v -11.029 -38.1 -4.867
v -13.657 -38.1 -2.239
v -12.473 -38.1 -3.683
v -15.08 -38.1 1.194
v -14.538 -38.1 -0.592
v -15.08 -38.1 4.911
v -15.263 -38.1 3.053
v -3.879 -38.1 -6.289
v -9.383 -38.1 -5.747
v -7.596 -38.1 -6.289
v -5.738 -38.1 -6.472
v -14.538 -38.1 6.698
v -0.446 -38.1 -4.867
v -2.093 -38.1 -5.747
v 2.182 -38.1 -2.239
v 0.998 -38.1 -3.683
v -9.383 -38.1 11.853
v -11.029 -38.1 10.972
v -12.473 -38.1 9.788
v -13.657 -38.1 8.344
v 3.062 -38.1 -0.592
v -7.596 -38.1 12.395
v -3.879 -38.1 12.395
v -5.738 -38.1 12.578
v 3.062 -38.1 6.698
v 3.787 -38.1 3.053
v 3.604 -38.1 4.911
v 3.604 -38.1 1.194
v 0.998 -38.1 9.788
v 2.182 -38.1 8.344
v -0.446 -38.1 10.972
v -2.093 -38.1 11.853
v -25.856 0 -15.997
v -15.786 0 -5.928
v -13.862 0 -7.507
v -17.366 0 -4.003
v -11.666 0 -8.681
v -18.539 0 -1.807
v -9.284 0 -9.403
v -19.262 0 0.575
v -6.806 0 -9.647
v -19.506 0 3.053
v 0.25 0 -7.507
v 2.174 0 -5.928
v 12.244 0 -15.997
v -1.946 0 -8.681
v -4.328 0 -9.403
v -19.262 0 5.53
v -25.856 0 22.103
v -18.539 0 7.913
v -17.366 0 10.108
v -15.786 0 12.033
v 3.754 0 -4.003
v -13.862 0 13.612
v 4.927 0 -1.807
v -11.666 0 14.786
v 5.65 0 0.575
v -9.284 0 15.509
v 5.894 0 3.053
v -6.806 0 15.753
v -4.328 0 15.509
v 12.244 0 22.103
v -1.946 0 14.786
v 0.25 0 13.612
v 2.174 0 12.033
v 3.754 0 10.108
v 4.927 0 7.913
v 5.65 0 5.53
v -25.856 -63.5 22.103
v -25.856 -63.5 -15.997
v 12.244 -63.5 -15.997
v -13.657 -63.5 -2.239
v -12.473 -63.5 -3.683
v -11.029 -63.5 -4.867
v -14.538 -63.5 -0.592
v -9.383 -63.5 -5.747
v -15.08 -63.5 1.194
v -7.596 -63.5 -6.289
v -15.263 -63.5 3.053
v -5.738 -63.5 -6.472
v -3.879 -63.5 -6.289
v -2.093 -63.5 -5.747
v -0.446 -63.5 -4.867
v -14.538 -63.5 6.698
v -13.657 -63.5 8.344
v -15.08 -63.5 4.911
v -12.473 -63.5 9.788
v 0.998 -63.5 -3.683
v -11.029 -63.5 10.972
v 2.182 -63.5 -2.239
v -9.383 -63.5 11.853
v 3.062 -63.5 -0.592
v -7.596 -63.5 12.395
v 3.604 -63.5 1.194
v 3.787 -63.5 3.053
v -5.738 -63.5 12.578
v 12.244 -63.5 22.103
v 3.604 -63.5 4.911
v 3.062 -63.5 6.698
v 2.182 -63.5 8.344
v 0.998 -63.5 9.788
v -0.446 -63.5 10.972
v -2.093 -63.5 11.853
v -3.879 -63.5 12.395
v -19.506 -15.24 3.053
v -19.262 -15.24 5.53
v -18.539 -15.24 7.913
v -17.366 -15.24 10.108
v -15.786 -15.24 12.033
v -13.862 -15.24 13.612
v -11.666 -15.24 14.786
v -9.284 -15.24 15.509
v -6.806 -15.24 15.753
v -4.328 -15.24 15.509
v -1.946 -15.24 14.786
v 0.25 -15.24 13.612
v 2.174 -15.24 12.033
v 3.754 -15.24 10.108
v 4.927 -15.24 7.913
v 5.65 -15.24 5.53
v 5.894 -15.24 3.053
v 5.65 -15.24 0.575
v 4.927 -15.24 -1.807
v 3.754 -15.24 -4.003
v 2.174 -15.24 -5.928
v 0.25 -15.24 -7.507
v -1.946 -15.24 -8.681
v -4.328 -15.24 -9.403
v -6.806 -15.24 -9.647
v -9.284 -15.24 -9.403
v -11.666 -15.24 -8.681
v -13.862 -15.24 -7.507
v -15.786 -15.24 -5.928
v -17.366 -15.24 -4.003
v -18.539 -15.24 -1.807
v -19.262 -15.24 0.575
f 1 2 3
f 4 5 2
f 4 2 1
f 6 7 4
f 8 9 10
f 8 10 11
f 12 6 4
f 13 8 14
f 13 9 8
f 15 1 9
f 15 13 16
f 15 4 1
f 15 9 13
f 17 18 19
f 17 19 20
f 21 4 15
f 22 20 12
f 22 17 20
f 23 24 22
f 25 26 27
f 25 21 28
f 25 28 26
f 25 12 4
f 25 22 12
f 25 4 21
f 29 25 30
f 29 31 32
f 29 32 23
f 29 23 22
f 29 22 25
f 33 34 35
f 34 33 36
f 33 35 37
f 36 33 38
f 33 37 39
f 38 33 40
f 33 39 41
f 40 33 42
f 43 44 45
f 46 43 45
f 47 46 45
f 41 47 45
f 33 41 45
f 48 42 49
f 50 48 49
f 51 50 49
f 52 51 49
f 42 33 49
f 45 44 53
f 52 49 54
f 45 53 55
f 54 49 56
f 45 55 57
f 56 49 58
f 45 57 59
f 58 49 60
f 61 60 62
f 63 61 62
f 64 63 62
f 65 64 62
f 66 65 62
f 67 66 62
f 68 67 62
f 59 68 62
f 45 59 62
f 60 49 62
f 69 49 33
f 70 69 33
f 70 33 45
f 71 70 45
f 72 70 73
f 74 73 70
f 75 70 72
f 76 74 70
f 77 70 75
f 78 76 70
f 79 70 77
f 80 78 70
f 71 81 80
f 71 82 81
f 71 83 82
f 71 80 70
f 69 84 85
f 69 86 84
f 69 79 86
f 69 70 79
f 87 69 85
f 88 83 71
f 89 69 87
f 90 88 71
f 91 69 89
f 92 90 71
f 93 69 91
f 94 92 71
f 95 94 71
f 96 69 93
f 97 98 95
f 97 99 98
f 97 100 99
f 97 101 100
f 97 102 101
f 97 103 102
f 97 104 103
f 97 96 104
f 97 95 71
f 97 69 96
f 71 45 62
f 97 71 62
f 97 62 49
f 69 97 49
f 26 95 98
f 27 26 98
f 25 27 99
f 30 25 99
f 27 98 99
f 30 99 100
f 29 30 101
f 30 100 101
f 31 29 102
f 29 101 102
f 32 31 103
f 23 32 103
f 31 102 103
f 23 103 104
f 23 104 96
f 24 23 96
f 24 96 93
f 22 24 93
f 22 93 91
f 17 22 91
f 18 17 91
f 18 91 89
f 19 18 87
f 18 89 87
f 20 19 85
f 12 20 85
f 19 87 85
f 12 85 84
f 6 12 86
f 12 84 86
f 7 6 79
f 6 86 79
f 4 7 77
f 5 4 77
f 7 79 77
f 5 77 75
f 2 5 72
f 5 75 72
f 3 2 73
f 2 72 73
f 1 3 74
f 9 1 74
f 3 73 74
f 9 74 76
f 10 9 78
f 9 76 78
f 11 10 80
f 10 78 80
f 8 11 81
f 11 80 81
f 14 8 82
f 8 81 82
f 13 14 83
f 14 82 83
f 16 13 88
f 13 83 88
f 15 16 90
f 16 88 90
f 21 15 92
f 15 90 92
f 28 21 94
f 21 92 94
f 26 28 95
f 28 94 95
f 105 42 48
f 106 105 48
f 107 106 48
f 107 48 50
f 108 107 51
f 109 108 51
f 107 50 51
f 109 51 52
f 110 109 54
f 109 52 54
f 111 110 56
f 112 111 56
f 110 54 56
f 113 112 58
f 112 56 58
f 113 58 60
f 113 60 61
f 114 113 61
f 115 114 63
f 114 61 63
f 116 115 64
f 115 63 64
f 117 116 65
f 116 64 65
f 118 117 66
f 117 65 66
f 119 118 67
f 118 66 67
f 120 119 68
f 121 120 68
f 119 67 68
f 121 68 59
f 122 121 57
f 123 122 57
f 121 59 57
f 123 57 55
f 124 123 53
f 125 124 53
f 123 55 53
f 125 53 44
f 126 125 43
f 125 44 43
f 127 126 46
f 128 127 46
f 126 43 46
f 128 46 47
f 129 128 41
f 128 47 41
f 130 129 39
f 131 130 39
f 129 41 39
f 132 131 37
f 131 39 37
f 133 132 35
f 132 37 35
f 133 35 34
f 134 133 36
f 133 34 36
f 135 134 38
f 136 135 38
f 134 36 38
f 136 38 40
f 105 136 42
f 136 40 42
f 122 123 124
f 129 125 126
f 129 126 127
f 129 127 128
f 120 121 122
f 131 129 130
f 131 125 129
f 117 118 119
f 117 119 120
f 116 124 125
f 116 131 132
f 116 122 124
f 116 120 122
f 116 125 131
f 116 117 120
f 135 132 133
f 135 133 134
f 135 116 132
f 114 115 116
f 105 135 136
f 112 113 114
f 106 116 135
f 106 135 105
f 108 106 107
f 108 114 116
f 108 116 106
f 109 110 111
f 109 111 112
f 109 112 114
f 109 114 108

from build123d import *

# Parameters (mm, degrees)
F0_W     = 19.05
F0_H     = 19.05
F1_DEPTH = 63.5
F2_R     = 12.7
F3_DEPTH = 15.24
F4_R     = 9.525
F5_DEPTH = 25.4


with BuildPart() as f1:
    # F0 (on Front) → F1 (new body)
    with BuildSketch(Plane.XZ):
        with Locations((-16.331094, 12.57759)):
            Rectangle(F0_W, F0_H)
        with Locations((2.718906, 12.57759)):
            Rectangle(F0_W, F0_H)
        with Locations((-16.331094, -6.47241)):
            Rectangle(F0_W, F0_H)
        with Locations((2.718906, -6.47241)):
            Rectangle(F0_W, F0_H)
    extrude(amount=F1_DEPTH)

    # F2 (on face) → F3 (cut)
    with BuildSketch(Plane(origin=(0, 0, 0), x_dir=(-1, 0, 0), z_dir=(0, 1, 0))):
        with Locations((6.806094, 3.05259)):
            Circle(F2_R)
    extrude(amount=-F3_DEPTH, mode=Mode.SUBTRACT)

    # F4 (on face) → F5 (cut)
    with BuildSketch(Plane.XZ.offset(63.5)):
        with Locations((-5.737578, 3.05259)):
            Circle(F4_R)
    extrude(amount=-F5_DEPTH, mode=Mode.SUBTRACT)


solid = f1.part
